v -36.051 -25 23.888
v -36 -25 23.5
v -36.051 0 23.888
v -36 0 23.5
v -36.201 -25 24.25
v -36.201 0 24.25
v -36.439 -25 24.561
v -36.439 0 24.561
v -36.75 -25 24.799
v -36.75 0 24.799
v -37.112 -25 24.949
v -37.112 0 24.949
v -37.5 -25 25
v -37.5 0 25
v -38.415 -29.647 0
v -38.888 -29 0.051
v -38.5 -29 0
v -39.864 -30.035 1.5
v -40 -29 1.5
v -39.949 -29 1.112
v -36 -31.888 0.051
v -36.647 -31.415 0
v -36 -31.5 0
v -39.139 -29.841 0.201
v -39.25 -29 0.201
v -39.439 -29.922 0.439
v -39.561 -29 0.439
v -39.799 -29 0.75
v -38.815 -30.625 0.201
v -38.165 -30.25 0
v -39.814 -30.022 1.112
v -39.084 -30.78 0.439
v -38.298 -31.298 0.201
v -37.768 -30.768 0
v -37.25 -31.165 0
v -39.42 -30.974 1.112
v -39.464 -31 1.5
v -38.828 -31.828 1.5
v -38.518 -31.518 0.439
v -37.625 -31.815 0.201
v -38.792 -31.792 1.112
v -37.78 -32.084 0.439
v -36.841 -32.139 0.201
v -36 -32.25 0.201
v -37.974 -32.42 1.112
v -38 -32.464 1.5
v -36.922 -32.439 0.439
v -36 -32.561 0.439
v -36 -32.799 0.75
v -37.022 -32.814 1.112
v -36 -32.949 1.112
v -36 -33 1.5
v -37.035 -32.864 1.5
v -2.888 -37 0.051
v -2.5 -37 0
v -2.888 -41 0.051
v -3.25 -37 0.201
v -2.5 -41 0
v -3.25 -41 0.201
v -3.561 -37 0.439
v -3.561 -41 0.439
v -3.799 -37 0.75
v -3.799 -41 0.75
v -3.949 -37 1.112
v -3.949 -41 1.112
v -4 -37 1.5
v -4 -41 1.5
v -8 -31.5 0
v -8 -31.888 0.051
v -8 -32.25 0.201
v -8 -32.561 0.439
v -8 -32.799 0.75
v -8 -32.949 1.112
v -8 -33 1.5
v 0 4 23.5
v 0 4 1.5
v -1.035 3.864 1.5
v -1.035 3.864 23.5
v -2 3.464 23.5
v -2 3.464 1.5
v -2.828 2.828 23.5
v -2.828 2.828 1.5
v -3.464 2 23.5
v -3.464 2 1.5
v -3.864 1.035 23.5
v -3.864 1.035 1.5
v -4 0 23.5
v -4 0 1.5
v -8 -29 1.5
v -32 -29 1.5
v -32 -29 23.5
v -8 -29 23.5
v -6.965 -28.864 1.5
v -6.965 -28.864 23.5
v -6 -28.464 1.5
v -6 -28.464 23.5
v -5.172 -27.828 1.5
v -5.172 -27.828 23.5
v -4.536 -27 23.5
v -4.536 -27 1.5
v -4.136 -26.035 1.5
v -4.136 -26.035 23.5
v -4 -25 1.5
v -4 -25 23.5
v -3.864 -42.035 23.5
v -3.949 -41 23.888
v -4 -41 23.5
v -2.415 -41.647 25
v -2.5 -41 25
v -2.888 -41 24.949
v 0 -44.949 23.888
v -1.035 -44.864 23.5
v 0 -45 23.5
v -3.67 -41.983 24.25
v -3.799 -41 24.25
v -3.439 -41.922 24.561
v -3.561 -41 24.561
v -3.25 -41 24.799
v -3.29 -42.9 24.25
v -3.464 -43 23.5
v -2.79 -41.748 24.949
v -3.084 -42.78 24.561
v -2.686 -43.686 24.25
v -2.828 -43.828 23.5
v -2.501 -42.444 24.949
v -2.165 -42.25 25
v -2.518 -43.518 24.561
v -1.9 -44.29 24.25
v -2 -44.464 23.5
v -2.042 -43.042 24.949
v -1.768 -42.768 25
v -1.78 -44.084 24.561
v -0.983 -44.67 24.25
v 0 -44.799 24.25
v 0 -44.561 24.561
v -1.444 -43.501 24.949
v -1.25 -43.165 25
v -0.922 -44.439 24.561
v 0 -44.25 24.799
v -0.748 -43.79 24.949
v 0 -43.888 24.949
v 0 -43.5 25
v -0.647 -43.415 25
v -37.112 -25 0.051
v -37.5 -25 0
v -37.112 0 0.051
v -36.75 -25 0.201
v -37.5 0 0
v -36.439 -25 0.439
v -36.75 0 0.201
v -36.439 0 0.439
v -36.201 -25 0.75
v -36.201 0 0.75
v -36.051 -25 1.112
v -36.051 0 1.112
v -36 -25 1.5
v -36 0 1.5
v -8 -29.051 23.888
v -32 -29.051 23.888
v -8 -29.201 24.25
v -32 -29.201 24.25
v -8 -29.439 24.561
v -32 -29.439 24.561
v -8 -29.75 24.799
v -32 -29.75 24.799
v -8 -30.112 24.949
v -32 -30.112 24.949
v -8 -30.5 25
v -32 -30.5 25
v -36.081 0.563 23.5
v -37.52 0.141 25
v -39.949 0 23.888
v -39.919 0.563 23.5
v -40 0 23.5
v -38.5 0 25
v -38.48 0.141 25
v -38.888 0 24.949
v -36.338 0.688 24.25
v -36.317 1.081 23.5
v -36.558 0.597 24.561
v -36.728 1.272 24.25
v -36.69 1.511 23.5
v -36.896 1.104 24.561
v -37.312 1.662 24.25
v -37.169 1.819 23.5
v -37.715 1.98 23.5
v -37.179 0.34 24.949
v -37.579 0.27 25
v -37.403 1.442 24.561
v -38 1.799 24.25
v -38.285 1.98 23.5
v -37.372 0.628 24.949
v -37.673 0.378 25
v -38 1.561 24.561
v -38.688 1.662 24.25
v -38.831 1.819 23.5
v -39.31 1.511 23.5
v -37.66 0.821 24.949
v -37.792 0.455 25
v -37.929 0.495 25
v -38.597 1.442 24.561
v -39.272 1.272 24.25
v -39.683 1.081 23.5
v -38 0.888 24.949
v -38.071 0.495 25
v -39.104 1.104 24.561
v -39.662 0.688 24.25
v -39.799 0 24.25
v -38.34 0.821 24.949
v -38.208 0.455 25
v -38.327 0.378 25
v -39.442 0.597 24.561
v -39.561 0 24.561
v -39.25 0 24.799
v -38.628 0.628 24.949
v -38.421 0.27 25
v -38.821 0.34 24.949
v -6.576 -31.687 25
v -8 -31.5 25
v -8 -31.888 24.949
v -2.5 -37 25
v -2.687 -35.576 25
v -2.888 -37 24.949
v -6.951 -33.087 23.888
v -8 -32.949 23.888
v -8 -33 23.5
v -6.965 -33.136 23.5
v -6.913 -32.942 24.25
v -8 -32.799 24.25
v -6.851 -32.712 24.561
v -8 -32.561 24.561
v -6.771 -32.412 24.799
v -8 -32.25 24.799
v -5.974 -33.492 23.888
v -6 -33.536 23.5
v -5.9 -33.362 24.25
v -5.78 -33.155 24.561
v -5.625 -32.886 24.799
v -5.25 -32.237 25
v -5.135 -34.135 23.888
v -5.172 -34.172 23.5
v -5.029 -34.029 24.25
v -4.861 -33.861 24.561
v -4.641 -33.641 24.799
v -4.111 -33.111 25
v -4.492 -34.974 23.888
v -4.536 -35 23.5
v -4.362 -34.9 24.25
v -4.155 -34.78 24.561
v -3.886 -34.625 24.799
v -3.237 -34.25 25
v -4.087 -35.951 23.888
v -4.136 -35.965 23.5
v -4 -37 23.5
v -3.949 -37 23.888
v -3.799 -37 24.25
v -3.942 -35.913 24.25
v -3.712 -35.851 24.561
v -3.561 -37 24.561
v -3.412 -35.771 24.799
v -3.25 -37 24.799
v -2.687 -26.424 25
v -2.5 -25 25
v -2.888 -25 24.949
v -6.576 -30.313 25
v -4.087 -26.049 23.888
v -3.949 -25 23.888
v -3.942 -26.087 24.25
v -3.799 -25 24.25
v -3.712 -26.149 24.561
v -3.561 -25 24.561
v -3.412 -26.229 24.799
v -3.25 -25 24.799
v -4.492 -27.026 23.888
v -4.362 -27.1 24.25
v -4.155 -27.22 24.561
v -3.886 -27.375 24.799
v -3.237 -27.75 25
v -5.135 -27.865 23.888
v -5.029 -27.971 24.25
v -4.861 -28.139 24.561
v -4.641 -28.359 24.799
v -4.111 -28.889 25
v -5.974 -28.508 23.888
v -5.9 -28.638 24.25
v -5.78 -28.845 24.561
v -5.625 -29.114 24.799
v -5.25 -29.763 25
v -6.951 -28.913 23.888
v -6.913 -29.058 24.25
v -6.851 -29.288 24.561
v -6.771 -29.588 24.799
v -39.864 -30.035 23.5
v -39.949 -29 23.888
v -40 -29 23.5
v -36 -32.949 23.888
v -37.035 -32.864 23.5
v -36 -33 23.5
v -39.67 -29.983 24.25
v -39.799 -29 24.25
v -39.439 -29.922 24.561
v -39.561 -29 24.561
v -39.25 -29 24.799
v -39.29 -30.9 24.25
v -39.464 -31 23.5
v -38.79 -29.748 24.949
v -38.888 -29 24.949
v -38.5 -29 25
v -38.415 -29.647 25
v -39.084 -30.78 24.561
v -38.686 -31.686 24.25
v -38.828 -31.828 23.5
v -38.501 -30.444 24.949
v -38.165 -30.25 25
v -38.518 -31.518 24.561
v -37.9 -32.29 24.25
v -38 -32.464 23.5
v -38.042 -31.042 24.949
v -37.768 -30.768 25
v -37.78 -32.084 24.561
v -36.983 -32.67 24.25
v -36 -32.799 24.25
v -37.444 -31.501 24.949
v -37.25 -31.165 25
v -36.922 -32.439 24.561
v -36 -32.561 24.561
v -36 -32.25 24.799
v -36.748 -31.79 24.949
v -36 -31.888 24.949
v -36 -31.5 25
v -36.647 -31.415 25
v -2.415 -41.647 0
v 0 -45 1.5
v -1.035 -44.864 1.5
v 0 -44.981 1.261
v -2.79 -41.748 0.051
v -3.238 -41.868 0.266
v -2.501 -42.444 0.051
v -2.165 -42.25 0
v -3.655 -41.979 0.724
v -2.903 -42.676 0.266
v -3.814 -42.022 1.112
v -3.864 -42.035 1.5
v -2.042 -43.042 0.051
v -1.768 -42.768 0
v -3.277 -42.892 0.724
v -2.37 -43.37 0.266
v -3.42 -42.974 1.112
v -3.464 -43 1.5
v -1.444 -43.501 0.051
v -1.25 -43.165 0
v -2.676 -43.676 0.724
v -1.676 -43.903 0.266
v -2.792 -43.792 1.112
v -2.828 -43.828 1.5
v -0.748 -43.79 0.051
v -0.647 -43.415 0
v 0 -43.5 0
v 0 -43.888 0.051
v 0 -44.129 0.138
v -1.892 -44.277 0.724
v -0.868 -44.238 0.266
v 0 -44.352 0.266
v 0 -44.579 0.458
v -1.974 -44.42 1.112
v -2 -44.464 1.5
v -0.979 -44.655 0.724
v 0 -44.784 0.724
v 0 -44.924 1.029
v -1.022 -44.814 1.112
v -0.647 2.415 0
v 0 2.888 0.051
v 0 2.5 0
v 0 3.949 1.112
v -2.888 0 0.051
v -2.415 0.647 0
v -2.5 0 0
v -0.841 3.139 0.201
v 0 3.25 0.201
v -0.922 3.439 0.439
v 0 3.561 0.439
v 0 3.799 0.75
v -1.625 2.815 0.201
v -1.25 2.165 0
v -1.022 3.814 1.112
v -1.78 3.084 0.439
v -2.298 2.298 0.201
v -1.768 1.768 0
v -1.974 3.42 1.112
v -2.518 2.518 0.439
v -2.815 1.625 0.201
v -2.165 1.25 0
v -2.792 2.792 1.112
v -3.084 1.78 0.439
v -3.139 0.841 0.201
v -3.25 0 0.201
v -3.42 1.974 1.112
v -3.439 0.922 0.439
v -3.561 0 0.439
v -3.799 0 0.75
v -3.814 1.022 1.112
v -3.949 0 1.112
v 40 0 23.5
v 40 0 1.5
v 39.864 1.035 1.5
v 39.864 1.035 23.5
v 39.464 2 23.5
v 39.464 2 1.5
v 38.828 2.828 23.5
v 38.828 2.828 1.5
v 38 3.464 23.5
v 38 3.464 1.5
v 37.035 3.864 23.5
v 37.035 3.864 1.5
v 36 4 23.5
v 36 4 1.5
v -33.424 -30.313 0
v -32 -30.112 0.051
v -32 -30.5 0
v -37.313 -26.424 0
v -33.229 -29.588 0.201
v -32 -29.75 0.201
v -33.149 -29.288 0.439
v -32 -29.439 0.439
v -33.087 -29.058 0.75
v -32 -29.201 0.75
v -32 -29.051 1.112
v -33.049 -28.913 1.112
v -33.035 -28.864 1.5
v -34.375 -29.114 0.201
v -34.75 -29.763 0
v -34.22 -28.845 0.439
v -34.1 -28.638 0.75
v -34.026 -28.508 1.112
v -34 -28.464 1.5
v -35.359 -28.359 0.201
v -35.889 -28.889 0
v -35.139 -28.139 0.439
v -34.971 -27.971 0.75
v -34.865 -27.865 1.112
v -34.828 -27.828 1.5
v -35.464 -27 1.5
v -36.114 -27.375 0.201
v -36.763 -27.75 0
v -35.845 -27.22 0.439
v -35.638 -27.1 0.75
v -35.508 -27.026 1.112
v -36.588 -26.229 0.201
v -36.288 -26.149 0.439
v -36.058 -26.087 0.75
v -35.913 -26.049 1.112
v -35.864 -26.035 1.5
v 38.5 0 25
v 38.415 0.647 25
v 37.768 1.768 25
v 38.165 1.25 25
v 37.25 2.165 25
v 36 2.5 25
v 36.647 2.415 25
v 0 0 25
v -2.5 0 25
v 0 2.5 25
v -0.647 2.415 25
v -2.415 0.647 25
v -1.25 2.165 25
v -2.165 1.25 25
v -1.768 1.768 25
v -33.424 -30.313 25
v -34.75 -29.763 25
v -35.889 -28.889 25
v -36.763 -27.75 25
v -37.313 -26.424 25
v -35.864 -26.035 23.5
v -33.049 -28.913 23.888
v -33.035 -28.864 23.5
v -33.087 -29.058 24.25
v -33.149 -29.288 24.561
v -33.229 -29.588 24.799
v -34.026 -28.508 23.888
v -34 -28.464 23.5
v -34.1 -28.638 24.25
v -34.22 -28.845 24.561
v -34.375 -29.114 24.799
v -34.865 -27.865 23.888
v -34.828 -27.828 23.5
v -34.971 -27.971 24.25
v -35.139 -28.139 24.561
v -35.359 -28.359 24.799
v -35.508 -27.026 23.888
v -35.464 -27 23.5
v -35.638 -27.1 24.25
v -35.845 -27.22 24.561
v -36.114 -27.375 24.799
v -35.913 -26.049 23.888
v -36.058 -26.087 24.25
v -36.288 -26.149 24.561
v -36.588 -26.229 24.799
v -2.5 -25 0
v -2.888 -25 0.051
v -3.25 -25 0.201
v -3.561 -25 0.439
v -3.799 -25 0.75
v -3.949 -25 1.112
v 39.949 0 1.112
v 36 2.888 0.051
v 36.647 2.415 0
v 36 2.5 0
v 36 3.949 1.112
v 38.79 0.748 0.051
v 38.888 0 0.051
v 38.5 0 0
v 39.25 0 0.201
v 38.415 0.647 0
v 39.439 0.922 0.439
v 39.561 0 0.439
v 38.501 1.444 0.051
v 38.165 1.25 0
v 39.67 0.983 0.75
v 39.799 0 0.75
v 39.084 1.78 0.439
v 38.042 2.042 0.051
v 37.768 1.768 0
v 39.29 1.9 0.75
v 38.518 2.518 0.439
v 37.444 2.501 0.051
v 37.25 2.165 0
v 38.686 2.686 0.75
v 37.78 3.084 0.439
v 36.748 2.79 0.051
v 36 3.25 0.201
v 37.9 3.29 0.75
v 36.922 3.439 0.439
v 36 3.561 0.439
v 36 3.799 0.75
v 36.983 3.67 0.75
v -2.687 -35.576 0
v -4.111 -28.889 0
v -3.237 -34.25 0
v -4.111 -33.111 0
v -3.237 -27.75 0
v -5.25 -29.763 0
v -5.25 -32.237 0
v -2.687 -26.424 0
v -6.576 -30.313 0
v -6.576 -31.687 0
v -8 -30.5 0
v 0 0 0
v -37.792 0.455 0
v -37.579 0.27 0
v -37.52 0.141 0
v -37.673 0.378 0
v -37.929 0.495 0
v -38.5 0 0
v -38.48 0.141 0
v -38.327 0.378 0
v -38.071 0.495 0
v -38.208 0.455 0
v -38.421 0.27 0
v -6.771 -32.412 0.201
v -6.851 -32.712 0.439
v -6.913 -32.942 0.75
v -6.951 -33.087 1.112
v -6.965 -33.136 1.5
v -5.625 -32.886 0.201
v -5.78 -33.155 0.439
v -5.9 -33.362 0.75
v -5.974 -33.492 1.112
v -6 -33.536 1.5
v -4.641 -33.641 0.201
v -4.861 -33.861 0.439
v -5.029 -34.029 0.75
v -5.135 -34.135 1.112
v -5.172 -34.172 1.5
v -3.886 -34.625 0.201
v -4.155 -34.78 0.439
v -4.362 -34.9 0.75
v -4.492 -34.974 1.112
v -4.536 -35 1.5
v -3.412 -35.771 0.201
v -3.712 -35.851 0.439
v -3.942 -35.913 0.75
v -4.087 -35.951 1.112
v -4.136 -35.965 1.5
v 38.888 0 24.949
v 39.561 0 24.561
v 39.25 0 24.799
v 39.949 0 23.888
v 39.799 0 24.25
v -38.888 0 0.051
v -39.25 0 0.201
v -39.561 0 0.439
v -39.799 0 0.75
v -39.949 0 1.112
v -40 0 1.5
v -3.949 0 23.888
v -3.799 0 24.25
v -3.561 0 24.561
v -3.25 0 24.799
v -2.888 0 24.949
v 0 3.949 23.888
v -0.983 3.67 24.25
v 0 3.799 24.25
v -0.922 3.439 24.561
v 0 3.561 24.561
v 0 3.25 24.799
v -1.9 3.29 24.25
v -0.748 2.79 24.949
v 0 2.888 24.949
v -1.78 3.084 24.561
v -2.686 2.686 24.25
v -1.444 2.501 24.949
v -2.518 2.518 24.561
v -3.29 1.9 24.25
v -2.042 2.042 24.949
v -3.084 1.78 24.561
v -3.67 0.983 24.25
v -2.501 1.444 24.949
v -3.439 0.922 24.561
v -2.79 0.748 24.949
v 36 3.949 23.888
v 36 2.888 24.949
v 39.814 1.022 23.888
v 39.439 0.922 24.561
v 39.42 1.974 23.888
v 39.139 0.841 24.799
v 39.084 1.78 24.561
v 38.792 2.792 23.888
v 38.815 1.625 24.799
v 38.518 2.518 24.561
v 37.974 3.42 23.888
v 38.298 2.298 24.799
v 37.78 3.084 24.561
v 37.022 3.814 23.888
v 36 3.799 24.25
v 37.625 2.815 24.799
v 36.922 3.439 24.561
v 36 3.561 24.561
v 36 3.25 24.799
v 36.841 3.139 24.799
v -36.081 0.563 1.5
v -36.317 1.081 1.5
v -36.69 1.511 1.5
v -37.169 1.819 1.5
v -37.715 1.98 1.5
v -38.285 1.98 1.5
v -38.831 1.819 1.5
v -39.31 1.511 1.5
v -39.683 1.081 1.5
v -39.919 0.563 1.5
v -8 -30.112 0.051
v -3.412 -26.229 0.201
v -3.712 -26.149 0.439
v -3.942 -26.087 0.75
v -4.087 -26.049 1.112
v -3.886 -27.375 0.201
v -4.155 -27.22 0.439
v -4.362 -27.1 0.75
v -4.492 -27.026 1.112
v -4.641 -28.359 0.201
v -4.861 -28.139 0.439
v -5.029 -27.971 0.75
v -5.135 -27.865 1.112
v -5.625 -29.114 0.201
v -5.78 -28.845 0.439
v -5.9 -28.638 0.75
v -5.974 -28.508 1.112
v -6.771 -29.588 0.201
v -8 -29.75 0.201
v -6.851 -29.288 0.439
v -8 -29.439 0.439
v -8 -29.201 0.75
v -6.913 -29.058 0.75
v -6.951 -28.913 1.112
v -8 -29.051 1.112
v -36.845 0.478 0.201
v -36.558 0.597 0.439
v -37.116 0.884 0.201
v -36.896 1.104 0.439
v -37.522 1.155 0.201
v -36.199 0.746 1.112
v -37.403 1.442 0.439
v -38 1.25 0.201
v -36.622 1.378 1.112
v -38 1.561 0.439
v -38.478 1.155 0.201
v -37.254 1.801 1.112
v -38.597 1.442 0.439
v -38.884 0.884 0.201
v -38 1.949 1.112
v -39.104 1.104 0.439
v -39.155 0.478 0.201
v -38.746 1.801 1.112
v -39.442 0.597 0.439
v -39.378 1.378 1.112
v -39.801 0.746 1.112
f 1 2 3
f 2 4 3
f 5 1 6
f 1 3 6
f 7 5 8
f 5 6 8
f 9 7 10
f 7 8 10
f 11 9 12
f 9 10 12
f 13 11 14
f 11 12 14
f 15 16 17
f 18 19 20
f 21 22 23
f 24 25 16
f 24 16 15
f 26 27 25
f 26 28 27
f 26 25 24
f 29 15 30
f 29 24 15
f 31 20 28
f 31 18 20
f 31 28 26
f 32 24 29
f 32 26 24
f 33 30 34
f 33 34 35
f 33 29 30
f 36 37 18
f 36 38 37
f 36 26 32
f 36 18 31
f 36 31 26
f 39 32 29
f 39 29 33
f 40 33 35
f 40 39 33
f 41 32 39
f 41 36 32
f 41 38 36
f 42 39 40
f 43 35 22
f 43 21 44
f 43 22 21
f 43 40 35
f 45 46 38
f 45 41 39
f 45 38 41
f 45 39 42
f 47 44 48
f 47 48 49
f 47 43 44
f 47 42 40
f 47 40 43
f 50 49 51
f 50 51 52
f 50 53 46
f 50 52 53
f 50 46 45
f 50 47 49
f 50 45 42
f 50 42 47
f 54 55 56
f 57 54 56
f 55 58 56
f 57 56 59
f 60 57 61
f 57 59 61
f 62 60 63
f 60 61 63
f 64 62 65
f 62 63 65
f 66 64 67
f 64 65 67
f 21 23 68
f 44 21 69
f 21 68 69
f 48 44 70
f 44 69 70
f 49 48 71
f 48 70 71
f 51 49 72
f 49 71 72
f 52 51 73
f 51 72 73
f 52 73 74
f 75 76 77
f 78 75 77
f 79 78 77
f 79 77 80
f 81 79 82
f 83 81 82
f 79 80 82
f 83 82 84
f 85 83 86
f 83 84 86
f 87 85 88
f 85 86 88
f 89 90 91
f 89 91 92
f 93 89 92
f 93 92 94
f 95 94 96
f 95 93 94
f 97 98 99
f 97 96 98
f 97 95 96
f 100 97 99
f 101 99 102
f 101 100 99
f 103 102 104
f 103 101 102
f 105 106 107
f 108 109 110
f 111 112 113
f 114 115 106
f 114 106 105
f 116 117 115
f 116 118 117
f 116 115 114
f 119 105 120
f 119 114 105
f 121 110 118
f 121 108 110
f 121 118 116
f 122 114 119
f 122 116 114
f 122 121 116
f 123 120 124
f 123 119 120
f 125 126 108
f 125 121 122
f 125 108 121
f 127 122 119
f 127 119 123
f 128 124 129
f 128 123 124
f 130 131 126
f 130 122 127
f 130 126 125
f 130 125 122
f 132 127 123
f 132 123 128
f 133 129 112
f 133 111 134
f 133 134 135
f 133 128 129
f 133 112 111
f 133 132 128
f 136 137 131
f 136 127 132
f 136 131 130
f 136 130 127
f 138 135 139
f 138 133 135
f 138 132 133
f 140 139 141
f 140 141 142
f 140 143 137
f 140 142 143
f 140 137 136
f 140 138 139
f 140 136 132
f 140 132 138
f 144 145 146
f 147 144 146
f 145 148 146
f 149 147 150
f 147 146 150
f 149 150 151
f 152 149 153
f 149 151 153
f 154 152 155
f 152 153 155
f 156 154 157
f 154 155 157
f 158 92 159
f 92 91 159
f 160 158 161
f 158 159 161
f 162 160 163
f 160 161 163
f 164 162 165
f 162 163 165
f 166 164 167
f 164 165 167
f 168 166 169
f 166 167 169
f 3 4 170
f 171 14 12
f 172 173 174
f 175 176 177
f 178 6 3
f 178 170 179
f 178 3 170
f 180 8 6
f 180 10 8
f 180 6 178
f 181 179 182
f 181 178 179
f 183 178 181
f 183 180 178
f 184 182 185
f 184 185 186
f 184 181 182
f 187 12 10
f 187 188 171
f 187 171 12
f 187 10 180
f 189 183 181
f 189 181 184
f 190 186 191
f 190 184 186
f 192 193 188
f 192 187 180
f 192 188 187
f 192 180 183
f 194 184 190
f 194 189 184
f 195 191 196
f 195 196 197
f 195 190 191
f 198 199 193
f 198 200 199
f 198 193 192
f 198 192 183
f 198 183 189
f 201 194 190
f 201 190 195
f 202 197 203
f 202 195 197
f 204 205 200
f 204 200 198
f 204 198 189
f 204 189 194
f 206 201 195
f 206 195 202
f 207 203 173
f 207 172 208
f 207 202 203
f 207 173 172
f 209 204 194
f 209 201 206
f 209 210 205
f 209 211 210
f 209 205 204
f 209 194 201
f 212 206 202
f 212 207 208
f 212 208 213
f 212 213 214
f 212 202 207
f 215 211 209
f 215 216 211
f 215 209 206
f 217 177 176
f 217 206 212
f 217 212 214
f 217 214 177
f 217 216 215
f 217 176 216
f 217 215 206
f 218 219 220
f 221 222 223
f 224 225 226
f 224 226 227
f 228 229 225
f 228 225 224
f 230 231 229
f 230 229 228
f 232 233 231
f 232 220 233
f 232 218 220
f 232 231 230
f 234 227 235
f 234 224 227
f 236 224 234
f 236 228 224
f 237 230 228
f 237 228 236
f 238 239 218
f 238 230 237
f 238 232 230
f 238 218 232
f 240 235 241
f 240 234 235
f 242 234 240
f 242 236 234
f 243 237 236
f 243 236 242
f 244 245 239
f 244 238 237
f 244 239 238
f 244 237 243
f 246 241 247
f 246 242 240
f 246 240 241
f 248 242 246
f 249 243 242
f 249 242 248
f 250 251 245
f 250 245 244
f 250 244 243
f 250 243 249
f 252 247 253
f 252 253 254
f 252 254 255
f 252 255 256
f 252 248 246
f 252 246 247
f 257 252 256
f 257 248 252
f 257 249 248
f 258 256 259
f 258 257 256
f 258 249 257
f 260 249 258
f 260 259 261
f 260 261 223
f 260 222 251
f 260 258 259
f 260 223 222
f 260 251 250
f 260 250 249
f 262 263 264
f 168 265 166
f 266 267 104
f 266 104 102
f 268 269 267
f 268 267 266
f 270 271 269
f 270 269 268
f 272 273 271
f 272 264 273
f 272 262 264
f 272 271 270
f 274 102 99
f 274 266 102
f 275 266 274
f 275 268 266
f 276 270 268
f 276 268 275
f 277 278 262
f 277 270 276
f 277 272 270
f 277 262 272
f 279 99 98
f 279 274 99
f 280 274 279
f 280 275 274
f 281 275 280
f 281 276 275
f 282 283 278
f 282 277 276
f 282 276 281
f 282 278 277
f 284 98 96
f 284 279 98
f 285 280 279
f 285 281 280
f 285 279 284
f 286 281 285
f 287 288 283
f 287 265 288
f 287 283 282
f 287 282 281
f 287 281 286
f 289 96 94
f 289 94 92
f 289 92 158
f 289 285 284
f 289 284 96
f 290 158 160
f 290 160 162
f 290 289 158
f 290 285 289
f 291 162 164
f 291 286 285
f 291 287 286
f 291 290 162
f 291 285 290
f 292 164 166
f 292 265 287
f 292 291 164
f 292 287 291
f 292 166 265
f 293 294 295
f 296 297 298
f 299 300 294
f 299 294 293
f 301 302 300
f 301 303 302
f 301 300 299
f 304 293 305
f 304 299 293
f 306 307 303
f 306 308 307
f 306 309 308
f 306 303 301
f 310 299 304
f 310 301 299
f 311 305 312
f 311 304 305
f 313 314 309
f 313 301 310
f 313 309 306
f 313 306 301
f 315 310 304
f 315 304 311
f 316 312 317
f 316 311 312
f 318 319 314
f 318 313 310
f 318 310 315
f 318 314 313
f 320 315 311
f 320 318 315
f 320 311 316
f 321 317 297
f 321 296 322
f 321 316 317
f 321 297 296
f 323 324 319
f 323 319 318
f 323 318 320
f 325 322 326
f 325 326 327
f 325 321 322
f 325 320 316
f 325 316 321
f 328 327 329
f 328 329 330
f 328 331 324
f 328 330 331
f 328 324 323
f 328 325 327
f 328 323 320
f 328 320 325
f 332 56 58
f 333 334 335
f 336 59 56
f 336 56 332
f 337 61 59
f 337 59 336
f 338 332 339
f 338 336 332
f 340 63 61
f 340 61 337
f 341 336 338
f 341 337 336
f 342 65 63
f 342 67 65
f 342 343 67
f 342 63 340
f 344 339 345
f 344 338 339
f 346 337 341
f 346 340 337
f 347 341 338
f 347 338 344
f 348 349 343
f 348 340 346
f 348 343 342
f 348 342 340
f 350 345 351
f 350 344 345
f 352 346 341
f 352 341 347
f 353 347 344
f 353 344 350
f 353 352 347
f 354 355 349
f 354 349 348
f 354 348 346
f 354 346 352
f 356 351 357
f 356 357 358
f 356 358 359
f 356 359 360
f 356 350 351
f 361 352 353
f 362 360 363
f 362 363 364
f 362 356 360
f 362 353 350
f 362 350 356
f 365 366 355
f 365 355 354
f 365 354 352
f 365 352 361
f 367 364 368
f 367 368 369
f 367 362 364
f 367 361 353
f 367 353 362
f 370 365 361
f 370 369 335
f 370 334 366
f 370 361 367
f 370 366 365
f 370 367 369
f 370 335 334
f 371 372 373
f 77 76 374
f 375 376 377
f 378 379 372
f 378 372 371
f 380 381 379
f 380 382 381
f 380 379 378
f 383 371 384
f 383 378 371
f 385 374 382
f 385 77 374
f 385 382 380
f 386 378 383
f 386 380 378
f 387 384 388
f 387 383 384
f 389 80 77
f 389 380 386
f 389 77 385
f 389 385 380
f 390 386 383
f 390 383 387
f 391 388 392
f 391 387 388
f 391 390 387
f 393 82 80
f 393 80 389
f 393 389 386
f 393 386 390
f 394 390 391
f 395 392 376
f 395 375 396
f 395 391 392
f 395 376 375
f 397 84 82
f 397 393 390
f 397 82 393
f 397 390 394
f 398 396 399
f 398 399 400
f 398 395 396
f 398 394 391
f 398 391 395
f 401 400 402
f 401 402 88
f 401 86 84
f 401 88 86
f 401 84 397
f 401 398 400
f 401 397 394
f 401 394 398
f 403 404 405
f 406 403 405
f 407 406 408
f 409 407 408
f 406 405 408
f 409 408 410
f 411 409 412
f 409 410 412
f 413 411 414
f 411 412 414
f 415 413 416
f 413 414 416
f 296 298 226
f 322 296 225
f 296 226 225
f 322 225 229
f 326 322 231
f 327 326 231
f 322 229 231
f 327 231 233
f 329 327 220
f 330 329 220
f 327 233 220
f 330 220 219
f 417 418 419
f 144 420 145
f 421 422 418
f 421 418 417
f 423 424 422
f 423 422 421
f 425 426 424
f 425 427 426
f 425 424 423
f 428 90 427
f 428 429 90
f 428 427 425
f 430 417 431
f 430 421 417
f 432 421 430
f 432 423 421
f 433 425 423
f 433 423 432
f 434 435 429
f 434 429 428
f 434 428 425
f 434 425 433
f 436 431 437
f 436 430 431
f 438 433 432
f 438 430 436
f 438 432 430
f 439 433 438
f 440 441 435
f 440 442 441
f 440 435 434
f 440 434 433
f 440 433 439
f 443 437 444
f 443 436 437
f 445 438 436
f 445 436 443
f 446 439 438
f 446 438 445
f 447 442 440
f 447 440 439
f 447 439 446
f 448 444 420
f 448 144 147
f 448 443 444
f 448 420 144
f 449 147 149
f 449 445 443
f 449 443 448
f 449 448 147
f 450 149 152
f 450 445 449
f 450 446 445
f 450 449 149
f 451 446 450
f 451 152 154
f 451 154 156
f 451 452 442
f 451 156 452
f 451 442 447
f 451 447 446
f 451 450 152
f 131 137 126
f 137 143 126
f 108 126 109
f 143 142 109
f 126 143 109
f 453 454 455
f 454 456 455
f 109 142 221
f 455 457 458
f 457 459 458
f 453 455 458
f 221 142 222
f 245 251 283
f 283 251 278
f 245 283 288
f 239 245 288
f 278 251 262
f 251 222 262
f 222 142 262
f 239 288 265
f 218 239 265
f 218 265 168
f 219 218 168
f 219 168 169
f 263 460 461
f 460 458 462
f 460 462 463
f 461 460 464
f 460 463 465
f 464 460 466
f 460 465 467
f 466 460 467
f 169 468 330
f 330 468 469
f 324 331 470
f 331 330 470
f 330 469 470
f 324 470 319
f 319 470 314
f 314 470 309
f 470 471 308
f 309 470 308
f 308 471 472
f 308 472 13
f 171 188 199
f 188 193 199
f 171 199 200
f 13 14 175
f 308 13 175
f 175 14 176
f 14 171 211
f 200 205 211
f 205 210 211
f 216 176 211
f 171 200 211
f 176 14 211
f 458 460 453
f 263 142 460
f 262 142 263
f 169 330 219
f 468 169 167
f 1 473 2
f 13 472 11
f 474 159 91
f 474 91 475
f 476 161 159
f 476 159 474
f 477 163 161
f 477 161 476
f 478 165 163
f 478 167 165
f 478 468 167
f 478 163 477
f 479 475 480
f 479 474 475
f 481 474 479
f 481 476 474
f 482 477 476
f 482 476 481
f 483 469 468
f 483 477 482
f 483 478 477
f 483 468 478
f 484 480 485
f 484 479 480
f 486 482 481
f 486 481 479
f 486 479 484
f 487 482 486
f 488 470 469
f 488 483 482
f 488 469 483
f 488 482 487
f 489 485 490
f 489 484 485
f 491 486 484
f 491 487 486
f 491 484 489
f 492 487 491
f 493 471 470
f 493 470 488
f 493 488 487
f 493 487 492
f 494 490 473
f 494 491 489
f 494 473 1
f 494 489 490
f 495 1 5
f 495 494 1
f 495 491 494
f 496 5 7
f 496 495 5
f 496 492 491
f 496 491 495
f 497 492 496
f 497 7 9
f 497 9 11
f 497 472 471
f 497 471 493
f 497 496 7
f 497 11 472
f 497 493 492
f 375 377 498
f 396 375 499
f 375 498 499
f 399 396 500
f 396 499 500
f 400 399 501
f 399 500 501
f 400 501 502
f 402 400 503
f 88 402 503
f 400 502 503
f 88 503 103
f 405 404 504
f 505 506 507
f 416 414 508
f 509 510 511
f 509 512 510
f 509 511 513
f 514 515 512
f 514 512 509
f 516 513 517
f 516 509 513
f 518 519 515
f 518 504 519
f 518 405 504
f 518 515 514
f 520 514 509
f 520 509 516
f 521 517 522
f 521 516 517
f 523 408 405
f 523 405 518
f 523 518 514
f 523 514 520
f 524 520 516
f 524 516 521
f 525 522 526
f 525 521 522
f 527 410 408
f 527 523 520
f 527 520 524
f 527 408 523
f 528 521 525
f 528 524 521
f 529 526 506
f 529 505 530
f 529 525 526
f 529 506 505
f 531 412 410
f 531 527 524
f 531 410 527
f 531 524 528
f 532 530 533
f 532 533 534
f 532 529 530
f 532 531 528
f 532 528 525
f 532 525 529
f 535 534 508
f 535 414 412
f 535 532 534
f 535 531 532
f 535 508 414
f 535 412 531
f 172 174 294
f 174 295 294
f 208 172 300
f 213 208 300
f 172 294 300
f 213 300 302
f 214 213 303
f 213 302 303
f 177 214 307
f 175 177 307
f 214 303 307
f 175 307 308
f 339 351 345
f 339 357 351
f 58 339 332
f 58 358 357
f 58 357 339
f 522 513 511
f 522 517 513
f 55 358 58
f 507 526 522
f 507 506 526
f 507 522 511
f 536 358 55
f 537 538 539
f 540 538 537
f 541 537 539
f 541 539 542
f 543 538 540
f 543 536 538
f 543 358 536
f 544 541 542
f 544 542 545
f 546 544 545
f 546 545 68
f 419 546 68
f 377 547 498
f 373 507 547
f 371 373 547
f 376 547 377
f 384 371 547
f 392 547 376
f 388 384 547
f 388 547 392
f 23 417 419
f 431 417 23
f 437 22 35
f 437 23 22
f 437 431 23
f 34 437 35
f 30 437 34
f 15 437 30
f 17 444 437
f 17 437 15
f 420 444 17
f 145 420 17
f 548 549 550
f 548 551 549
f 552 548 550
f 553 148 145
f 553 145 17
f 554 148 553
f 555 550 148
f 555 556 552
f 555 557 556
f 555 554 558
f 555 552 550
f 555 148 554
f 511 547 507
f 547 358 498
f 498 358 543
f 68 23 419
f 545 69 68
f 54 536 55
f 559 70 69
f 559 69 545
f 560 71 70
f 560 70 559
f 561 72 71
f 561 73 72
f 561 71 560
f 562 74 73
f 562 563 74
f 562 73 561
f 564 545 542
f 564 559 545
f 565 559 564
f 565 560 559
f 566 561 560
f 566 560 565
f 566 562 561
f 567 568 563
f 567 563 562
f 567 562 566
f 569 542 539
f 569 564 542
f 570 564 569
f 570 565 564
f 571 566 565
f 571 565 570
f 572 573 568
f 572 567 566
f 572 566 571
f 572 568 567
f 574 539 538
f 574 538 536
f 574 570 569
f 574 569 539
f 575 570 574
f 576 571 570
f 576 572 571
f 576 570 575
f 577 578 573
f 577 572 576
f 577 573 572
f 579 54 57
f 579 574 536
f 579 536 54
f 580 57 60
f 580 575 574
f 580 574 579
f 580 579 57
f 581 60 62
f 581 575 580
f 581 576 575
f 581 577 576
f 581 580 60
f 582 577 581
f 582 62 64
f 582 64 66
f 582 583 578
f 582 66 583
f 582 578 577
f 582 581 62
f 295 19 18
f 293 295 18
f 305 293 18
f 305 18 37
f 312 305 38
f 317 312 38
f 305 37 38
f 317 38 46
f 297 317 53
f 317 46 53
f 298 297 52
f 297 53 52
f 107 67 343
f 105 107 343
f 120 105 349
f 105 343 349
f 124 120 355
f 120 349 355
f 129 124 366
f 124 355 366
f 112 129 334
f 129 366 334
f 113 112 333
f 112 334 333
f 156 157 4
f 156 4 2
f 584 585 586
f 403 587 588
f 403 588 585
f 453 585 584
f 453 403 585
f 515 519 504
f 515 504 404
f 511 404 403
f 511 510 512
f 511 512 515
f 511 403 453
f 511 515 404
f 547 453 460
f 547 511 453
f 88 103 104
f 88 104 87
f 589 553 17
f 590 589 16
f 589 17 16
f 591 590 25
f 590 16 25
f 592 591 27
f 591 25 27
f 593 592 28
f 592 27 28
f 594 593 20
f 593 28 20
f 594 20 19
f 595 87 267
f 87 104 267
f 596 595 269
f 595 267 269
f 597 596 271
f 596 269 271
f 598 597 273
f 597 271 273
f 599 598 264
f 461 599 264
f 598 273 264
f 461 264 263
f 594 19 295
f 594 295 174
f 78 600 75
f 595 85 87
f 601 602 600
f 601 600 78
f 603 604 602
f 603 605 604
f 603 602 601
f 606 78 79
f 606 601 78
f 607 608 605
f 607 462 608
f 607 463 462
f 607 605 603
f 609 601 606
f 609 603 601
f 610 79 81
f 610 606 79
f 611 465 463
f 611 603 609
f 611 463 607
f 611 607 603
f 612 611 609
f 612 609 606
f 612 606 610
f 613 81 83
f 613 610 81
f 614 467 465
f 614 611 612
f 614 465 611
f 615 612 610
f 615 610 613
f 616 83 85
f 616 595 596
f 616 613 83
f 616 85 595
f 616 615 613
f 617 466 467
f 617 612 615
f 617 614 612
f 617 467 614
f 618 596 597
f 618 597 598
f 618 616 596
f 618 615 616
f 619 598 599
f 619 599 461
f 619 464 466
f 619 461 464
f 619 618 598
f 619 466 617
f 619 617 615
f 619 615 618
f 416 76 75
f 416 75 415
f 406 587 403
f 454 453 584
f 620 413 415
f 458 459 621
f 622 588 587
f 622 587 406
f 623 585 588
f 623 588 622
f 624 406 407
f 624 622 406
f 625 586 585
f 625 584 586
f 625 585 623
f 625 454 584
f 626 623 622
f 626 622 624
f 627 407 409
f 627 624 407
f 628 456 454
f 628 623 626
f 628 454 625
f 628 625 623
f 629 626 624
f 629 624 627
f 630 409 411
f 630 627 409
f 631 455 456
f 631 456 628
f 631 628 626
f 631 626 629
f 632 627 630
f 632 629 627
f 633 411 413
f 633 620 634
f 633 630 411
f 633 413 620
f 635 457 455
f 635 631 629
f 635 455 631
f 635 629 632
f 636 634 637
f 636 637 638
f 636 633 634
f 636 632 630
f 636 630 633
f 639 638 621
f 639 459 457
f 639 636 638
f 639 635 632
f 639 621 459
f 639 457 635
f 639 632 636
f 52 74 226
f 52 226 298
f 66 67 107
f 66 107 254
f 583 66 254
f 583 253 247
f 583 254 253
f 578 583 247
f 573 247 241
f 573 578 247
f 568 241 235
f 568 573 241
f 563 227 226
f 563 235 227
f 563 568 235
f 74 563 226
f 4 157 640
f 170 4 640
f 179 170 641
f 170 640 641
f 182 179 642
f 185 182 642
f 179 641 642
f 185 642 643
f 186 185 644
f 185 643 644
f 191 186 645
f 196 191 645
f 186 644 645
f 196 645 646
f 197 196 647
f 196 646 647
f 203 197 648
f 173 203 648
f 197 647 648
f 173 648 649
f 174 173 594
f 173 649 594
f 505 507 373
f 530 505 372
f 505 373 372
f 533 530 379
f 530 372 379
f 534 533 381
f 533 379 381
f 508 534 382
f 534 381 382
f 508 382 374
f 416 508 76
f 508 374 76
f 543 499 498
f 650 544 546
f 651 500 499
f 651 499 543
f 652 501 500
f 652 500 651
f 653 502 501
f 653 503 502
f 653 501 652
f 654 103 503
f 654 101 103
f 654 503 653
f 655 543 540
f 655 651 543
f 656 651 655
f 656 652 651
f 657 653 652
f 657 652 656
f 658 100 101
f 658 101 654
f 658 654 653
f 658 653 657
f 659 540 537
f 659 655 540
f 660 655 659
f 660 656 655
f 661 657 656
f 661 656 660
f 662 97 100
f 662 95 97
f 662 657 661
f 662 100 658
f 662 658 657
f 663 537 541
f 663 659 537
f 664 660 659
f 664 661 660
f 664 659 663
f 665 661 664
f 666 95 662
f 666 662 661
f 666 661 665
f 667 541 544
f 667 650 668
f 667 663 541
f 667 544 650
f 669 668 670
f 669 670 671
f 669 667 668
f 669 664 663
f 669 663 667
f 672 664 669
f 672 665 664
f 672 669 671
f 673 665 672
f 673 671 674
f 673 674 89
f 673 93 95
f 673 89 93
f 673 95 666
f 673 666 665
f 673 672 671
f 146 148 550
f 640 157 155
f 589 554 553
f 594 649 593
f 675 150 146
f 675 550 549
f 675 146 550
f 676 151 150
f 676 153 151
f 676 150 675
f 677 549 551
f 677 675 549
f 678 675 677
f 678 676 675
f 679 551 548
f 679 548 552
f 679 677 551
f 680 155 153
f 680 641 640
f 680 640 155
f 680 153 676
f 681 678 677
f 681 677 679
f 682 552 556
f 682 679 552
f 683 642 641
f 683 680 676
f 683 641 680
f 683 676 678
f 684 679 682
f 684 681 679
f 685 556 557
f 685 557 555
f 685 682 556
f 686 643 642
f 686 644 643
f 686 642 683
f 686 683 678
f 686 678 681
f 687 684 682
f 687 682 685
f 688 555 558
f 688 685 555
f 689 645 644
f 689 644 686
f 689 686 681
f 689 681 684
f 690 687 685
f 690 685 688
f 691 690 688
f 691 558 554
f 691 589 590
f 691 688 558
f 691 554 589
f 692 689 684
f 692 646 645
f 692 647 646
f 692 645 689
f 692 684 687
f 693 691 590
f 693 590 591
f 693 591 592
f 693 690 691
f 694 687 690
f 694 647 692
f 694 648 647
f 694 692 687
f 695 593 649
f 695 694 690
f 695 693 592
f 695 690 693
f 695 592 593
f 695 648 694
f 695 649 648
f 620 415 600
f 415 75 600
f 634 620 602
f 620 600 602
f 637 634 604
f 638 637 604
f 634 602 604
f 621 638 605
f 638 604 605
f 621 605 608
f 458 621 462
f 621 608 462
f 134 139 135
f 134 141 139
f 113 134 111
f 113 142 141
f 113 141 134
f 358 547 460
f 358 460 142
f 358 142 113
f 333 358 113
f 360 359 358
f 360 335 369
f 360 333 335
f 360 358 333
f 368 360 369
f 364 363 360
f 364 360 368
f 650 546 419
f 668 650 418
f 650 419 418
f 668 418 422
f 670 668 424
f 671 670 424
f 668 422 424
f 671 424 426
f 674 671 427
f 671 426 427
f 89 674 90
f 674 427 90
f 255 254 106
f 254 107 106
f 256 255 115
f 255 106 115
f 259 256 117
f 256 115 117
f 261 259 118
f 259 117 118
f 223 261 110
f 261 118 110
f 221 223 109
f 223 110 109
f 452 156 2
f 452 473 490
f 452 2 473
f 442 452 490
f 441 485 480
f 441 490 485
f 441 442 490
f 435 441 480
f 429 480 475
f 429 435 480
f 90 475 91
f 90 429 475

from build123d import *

# Parameters (mm, degrees)
PAD_DEPTH   = 25
FILLET_R    = 1.5
FILLET001_R = 1.5


with BuildPart() as part:
    # Sketch → Pad (new body)
    with BuildSketch(Plane.XY):
        with BuildLine():
            Line((0, 0), (0, -45))
            ThreePointArc((-4, -41), (-2.828427, -43.828427), (0, -45))
            Line((-4, -41), (-4, -37))
            ThreePointArc((-4, -37), (-5.171573, -34.171573), (-8, -33))
            Line((-8, -33), (-36, -33))
            ThreePointArc((-40, -29), (-38.828427, -31.828427), (-36, -33))
            Line((-40, -29), (-40, 0))
            ThreePointArc((-36, 0), (-38, 2), (-40, 0))
            Line((-36, 0), (-36, -25))
            ThreePointArc((-36, -25), (-34.828427, -27.828427), (-32, -29))
            Line((-32, -29), (-8, -29))
            ThreePointArc((-8, -29), (-5.171573, -27.828427), (-4, -25))
            Line((-4, -25), (-4, 0))
            ThreePointArc((0, 4), (-2.828427, 2.828427), (-4, 0))
            Line((0, 4), (36, 4))
            ThreePointArc((40, 0), (38.828427, 2.828427), (36, 4))
            Line((40, 0), (0, 0))
        make_face()
    extrude(amount=PAD_DEPTH)

    # Fillet
    fillet_edges = [part.edges().sort_by_distance(p)[0] for p in [
        (-2.828427, -43.828427, 25),
        (-4, -39, 25),
        (-5.171573, -34.171573, 25),
        (-22, -33, 25),
        (-38.828427, -31.828427, 25),
        (-40, -14.5, 25),
        (-38, 2, 25),
        (-36, -12.5, 25),
        (-34.828427, -27.828427, 25),
        (-20, -29, 25),
        (-5.171573, -27.828427, 25),
        (-4, -12.5, 25),
        (-2.828427, 2.828427, 25),
        (18, 4, 25),
        (38.828427, 2.828427, 25),
    ]]
    fillet(fillet_edges, radius=FILLET_R)

    # Fillet001
    fillet001_edges = [part.edges().sort_by_distance(p)[0] for p in [
        (38.828427, 2.828427, 0),
        (18, 4, 0),
        (-2.828427, 2.828427, 0),
        (-4, -12.5, 0),
        (-5.171573, -27.828427, 0),
        (-20, -29, 0),
        (-34.828427, -27.828427, 0),
        (-36, -12.5, 0),
        (-38, 2, 0),
        (-40, -14.5, 0),
        (-38.828427, -31.828427, 0),
        (-22, -33, 0),
        (-5.171573, -34.171573, 0),
        (-4, -39, 0),
        (-2.828427, -43.828427, 0),
    ]]
    fillet(fillet001_edges, radius=FILLET001_R)


solid = part.part
